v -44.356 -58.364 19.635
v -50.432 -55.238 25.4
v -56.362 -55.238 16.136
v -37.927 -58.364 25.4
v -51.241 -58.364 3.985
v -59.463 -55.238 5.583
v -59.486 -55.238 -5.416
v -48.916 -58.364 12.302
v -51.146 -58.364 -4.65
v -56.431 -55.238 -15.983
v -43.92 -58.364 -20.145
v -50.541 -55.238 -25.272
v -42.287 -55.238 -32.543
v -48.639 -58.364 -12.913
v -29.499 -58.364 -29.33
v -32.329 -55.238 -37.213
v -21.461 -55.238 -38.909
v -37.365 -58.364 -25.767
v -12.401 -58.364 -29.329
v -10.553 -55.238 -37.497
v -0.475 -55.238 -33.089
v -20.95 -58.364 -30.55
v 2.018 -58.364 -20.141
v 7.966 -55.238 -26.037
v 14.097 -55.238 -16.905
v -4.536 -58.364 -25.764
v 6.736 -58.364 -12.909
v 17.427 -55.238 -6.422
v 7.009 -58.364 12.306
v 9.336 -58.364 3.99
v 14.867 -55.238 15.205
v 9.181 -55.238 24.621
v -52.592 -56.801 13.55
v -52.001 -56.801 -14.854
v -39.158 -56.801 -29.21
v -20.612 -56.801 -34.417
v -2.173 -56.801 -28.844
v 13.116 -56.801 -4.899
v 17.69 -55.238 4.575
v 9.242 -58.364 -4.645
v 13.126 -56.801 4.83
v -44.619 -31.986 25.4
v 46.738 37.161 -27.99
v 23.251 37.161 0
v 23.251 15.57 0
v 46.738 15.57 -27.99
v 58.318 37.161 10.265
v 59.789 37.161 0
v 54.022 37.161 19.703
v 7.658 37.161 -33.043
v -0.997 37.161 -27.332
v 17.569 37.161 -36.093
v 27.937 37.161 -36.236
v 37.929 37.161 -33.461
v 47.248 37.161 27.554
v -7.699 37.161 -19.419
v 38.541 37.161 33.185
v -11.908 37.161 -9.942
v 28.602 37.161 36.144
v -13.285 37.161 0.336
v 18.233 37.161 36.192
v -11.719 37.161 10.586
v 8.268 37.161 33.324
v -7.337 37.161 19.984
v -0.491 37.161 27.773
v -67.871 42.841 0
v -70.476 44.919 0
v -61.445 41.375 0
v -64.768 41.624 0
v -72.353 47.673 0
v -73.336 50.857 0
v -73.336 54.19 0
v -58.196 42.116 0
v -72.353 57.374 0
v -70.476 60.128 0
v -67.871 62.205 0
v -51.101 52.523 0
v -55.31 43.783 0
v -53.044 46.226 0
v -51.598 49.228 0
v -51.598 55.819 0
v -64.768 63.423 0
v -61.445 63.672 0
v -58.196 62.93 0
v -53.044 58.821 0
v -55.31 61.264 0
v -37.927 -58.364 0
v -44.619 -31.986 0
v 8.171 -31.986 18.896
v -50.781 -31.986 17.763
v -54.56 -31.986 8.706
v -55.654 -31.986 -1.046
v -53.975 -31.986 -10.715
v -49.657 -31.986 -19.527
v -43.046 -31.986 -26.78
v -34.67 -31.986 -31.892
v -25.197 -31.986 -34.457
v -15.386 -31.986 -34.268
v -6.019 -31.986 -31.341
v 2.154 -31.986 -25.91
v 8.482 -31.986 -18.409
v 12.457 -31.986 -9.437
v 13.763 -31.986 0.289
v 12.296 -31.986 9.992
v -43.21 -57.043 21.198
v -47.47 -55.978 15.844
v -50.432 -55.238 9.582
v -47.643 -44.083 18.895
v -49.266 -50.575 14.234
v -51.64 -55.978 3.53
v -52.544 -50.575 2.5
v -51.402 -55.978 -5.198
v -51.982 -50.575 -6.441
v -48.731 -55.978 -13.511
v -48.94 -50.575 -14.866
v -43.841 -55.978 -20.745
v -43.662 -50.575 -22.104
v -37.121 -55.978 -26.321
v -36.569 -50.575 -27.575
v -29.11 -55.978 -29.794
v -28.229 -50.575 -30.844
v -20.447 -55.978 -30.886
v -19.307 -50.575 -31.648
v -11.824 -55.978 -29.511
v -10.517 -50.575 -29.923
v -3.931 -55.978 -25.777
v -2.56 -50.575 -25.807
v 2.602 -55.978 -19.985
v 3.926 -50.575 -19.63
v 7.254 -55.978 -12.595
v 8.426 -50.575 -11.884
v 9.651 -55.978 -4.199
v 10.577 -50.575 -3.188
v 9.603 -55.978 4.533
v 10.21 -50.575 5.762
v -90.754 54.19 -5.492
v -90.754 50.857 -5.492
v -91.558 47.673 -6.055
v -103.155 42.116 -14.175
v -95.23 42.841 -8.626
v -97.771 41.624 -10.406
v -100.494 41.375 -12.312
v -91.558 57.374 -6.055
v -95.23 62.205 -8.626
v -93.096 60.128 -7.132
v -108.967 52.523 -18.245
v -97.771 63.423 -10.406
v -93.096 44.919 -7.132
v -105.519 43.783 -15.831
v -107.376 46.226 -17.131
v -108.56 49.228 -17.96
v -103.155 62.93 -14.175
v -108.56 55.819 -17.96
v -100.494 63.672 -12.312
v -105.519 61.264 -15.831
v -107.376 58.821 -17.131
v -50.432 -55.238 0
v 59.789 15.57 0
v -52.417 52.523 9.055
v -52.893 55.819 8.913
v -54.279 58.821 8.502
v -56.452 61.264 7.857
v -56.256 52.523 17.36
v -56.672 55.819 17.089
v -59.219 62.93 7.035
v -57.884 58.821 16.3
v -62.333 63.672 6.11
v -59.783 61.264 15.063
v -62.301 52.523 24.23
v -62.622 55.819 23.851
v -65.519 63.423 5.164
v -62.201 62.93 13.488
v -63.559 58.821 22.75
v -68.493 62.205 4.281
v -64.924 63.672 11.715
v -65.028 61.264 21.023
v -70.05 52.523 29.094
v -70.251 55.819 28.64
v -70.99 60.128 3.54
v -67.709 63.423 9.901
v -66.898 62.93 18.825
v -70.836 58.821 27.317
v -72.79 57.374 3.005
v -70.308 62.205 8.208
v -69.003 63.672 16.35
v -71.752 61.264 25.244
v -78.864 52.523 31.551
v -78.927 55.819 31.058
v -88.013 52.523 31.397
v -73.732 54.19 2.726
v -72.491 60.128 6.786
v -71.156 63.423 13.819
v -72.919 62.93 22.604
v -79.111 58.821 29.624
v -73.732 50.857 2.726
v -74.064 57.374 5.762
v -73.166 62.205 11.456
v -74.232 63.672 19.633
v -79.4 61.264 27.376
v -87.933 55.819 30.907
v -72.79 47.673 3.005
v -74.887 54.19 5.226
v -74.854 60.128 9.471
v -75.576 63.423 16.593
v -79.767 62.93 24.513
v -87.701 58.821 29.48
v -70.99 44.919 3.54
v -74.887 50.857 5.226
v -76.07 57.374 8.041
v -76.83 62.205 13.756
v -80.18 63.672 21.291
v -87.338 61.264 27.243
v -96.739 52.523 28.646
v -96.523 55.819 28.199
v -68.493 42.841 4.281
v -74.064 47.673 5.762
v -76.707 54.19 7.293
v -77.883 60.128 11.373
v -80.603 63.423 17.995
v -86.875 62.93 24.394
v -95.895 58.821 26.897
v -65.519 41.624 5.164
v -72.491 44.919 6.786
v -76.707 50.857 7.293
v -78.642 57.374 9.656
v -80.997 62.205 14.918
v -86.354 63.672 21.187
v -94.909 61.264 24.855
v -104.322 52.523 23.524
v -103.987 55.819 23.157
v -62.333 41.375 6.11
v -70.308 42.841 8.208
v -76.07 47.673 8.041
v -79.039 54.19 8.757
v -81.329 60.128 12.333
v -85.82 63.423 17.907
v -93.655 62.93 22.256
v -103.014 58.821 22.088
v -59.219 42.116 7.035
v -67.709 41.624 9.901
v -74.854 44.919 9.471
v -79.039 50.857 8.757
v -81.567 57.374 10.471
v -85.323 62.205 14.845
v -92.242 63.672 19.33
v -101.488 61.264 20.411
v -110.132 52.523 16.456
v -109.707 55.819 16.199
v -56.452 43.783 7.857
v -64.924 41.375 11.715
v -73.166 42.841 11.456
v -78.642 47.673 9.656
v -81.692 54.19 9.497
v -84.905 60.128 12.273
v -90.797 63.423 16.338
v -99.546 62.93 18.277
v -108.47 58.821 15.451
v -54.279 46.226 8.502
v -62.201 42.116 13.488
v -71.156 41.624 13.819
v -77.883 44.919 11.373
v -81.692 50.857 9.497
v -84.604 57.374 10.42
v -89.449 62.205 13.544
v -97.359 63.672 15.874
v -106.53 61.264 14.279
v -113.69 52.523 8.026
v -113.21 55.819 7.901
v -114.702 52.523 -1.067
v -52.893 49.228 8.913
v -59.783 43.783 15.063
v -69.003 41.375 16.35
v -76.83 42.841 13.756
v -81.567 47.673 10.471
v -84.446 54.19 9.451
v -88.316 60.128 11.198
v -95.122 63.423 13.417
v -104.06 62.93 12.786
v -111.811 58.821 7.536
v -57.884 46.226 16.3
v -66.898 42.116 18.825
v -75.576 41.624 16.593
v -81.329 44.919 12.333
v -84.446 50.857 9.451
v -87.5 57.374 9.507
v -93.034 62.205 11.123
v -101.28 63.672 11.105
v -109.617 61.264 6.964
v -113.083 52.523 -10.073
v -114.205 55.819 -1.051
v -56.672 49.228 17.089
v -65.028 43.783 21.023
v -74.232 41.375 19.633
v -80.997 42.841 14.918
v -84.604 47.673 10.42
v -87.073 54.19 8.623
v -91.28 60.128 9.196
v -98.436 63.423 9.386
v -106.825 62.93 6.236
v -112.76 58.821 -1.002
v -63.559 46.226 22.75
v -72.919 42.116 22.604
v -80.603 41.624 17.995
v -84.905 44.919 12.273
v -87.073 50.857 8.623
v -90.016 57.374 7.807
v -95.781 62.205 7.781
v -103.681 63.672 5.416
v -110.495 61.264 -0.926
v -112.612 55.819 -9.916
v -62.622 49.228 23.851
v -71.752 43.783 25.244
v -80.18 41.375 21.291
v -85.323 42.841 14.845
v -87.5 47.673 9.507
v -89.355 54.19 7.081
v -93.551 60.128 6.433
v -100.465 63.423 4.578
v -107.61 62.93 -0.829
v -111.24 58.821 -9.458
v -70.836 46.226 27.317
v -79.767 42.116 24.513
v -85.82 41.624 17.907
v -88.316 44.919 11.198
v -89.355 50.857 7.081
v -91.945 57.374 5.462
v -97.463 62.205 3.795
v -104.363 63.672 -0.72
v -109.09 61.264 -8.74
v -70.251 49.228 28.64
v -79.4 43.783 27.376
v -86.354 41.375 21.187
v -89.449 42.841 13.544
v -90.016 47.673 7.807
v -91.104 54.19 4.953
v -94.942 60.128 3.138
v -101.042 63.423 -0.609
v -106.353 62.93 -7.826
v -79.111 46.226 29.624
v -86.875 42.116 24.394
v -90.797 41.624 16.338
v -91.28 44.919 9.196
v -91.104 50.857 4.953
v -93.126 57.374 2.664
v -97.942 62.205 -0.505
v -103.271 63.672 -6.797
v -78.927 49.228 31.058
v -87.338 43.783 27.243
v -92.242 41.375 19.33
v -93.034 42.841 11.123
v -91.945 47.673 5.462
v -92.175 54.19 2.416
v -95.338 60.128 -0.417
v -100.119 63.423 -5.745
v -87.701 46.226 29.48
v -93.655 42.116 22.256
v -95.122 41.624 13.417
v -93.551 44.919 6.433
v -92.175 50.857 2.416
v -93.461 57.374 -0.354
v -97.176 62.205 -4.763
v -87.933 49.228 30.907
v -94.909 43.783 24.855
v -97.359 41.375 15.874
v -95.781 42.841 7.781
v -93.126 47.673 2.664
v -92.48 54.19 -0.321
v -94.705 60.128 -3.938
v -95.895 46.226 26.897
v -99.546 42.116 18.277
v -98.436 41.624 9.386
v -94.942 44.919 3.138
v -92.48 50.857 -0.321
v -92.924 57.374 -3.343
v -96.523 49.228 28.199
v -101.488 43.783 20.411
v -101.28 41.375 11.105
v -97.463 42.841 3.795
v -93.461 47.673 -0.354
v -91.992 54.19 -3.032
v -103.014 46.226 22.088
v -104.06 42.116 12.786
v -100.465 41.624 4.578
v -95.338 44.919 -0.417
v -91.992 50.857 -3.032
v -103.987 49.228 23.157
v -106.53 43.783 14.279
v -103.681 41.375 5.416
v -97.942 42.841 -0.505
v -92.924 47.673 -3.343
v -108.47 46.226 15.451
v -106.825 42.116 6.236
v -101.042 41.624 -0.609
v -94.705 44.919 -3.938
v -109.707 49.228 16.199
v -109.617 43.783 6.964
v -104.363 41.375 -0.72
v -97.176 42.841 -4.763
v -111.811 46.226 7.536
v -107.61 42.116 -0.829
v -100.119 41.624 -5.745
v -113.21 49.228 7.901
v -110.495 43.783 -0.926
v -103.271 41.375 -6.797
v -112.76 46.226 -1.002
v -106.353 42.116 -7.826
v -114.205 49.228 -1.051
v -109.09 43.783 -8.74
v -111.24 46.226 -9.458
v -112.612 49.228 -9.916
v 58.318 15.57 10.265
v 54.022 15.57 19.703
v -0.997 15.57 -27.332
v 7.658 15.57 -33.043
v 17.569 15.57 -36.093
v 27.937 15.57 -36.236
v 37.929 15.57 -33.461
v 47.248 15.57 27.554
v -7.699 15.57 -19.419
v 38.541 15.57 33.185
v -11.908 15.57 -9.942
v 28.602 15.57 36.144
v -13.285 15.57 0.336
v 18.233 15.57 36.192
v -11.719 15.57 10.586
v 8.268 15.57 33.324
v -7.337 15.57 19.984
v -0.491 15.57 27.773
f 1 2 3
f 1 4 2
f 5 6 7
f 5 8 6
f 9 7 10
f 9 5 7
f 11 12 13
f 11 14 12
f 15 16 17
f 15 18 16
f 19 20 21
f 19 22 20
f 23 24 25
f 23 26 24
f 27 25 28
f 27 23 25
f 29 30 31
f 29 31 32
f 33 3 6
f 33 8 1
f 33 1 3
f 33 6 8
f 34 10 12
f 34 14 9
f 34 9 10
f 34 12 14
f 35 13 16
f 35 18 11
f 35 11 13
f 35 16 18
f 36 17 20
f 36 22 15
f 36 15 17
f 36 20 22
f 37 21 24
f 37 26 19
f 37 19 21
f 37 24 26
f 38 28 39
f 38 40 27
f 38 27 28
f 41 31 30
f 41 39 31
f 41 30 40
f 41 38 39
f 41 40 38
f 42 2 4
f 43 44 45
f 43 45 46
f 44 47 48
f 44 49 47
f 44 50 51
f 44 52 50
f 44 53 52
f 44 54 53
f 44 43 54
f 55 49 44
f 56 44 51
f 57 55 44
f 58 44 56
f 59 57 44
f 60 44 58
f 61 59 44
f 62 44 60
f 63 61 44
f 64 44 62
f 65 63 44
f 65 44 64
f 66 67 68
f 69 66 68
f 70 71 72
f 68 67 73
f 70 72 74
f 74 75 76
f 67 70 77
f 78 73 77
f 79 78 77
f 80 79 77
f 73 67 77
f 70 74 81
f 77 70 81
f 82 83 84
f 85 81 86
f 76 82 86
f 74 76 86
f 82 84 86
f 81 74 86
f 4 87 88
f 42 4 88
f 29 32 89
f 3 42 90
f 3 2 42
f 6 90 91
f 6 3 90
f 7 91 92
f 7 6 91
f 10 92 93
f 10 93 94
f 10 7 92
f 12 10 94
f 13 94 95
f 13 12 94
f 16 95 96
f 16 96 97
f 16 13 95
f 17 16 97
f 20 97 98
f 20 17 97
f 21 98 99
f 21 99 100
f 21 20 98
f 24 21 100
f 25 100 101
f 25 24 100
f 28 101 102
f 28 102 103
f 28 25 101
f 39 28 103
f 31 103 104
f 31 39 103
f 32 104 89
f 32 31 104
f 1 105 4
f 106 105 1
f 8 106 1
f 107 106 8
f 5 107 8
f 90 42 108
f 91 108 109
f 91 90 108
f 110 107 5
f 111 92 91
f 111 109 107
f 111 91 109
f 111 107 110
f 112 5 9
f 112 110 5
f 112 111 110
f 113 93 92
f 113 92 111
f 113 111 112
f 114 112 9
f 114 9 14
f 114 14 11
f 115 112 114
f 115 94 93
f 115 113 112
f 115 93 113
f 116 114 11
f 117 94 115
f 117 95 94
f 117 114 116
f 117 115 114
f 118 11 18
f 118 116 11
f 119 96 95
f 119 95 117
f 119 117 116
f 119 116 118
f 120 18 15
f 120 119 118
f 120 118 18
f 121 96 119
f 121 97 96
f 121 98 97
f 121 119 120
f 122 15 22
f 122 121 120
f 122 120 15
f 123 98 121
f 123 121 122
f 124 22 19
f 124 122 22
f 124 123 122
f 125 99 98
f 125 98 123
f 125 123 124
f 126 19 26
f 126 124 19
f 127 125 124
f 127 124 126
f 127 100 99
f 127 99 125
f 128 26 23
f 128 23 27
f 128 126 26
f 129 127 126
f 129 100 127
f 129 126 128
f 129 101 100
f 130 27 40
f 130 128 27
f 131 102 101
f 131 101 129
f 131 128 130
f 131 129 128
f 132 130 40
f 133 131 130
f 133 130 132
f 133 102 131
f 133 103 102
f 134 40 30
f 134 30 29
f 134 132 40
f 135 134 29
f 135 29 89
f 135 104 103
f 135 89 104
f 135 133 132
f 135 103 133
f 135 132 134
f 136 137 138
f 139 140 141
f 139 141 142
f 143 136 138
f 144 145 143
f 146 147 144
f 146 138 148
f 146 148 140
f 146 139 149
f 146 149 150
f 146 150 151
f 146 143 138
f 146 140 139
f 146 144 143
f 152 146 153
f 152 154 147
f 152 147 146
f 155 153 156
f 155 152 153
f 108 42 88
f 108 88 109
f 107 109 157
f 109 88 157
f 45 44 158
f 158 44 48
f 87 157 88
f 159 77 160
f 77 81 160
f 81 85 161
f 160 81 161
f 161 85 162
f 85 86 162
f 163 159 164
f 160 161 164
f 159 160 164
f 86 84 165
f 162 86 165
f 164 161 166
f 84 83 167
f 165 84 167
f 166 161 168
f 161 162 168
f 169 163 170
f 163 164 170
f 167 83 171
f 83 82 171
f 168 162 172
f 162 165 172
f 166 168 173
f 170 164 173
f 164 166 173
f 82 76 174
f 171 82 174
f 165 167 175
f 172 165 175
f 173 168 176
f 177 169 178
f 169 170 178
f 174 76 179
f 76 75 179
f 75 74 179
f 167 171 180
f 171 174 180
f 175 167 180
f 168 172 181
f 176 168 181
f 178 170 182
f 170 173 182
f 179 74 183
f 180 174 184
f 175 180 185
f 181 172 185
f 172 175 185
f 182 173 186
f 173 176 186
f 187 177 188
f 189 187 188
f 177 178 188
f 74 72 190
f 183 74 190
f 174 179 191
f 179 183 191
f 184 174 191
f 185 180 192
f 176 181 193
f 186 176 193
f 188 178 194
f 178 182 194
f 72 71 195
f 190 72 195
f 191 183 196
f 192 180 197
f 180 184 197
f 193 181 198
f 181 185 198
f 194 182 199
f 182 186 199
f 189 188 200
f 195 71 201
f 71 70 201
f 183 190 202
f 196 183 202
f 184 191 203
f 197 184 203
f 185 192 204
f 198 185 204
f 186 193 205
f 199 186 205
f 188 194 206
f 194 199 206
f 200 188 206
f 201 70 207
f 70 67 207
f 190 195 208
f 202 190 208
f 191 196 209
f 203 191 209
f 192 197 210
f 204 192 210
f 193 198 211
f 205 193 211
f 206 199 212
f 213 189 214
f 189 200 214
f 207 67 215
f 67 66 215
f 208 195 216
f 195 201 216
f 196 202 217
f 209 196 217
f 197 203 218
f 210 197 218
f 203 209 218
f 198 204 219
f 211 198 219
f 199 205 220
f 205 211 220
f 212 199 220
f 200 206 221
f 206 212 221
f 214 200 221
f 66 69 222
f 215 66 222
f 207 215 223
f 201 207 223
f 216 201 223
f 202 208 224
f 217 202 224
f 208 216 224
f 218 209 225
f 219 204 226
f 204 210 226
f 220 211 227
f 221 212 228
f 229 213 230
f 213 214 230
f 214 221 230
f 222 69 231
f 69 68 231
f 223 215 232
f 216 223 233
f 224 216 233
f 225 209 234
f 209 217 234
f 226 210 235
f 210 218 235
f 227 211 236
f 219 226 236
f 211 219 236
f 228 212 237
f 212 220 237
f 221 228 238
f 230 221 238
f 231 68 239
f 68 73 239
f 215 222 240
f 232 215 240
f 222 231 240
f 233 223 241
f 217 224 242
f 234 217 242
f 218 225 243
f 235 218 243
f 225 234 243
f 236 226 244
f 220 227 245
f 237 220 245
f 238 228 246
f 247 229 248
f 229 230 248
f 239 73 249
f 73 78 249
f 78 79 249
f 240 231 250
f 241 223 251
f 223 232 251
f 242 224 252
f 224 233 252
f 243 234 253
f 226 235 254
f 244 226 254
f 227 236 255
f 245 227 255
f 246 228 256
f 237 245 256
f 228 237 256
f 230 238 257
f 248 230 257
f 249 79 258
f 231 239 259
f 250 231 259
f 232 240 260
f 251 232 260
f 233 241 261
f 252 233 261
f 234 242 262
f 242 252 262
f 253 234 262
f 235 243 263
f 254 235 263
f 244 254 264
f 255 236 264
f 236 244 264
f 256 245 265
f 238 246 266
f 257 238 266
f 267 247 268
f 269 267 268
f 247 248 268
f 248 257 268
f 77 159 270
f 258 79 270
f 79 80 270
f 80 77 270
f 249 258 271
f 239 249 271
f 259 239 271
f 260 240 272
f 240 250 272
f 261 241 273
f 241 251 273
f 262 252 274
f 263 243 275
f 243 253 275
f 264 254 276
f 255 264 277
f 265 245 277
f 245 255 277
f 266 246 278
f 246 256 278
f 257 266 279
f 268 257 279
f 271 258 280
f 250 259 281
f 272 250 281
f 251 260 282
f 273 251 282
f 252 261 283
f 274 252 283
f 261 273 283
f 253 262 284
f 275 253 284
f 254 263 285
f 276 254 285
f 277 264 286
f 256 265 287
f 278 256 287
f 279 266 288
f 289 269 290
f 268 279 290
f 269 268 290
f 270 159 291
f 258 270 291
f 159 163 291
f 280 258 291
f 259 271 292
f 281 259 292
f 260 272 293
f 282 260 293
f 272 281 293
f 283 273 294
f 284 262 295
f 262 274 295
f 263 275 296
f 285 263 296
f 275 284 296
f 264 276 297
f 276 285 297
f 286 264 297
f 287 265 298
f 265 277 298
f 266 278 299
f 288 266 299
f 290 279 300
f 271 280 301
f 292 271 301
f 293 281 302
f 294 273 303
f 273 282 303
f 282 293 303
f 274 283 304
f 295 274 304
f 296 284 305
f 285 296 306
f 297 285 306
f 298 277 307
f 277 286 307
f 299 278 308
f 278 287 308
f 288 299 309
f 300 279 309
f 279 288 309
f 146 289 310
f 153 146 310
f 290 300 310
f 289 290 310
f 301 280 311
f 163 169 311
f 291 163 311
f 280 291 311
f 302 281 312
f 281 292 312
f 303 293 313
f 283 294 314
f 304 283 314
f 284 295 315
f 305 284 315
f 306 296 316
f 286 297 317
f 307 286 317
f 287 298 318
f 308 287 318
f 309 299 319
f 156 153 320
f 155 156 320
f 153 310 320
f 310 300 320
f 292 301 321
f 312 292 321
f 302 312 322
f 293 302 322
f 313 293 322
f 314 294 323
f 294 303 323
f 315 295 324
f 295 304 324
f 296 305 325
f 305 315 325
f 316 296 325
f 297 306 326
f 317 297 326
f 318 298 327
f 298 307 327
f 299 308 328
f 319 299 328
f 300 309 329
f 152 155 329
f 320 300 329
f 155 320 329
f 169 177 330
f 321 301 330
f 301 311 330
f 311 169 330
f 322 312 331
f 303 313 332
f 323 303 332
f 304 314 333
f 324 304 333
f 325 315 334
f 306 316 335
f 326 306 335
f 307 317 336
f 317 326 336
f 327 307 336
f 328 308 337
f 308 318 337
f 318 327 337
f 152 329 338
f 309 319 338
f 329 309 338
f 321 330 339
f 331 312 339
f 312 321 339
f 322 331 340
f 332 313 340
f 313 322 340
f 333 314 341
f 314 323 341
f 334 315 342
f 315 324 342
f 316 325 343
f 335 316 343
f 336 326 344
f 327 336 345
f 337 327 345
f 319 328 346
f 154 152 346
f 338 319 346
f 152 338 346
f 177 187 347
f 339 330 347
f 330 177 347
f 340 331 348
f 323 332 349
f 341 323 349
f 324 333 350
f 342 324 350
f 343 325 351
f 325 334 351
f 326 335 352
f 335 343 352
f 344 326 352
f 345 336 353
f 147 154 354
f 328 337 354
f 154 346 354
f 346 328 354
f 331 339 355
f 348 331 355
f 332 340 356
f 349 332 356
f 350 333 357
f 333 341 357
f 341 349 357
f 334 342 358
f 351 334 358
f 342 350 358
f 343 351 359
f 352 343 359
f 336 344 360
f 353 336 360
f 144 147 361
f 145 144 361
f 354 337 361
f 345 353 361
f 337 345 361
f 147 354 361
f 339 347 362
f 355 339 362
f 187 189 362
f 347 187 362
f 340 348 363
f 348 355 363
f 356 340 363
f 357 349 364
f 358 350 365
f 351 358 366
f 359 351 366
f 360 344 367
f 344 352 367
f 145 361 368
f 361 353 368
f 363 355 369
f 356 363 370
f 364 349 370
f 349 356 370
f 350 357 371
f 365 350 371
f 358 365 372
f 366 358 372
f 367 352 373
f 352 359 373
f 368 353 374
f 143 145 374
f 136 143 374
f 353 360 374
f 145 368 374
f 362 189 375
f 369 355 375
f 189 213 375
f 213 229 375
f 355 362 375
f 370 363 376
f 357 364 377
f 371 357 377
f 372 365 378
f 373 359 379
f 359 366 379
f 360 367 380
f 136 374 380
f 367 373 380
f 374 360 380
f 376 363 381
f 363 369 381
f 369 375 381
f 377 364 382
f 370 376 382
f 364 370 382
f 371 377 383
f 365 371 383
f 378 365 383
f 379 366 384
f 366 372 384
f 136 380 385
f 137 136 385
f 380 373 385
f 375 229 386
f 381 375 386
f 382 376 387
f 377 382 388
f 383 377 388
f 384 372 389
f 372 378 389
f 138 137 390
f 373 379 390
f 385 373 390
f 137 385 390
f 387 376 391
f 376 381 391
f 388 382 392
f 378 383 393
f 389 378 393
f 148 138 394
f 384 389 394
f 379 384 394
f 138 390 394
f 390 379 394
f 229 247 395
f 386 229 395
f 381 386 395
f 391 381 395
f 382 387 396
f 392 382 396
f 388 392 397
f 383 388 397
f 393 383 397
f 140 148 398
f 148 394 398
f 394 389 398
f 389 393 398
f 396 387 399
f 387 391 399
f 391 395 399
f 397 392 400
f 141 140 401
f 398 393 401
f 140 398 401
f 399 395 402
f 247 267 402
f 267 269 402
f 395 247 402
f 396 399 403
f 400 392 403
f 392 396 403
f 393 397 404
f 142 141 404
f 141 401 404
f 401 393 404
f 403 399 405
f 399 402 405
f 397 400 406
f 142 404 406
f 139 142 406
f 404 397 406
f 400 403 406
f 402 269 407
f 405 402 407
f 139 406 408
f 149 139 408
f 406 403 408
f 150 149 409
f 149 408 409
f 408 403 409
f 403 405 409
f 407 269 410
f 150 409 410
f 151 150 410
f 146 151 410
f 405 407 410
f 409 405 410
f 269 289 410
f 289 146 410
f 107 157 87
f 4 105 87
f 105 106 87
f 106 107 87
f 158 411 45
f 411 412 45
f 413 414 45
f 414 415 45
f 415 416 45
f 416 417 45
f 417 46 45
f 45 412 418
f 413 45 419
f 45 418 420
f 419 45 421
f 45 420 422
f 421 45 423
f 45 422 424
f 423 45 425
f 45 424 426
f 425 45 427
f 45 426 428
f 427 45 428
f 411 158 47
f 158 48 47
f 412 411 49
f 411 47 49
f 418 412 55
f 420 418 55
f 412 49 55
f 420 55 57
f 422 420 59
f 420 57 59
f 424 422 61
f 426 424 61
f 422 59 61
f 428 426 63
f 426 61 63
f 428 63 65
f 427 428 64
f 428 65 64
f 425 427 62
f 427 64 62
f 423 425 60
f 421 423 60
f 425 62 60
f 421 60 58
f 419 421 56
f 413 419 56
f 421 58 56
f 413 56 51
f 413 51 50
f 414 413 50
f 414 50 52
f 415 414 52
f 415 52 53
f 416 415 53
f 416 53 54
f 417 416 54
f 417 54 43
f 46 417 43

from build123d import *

# Parameters (mm, degrees)
F0_W     = 36.5379918367
F0_H     = 21.5906333178
F1_ANGLE = 310
F0_R     = 11.1797222355
F2_ANGLE = 215
F3_DEPTH = 25.4
F4_ANGLE = 260


with BuildPart() as f1:
    # F0 (on Top) → F1 (revolve)
    with BuildSketch(Plane.XY):
        with Locations((41.5204456076, 26.3654785231)):
            Rectangle(F0_W, F0_H)
    revolve(axis=Axis((23.2514496893, 26.3654785231, 0), (0, -1, 0)), revolution_arc=F1_ANGLE)


with BuildPart() as f2:
    # F0 (on Top) → F2 (revolve)
    with BuildSketch(Plane.XY):
        with Locations((-62.280677259, 52.5233596563)):
            Circle(F0_R)
    revolve(axis=Axis((-82.9103291035, 50.9820729494, 0), (0, -1, 0)), revolution_arc=F2_ANGLE)


with BuildPart() as f3:
    # F0 (on Top) → F3 (new body)
    with BuildSketch(Plane.XY):
        Polygon((-37.9269696142, -58.3638457864), (-44.6190871298, -31.9861508906), (-50.4319518805, -55.2375987172), align=None)
    extrude(amount=F3_DEPTH)

    # F3_face (on face) → F4 (revolve)
    with BuildSketch(Plane(origin=(-44.3260028748, -48.5291984647, 25.4), x_dir=(1, 0, 0), z_dir=(0, 0, 1))):
        Polygon((6.3990332606, -9.8346473217), (-0.293084255, 16.5430475741), (-6.1059490056, -6.7084002525), align=None)
    revolve(axis=Axis((-20.9524314851, -46.1031068116, 0), (0, -1, 0)), revolution_arc=F4_ANGLE)


solid = Compound([f1.part, f2.part, f3.part])
